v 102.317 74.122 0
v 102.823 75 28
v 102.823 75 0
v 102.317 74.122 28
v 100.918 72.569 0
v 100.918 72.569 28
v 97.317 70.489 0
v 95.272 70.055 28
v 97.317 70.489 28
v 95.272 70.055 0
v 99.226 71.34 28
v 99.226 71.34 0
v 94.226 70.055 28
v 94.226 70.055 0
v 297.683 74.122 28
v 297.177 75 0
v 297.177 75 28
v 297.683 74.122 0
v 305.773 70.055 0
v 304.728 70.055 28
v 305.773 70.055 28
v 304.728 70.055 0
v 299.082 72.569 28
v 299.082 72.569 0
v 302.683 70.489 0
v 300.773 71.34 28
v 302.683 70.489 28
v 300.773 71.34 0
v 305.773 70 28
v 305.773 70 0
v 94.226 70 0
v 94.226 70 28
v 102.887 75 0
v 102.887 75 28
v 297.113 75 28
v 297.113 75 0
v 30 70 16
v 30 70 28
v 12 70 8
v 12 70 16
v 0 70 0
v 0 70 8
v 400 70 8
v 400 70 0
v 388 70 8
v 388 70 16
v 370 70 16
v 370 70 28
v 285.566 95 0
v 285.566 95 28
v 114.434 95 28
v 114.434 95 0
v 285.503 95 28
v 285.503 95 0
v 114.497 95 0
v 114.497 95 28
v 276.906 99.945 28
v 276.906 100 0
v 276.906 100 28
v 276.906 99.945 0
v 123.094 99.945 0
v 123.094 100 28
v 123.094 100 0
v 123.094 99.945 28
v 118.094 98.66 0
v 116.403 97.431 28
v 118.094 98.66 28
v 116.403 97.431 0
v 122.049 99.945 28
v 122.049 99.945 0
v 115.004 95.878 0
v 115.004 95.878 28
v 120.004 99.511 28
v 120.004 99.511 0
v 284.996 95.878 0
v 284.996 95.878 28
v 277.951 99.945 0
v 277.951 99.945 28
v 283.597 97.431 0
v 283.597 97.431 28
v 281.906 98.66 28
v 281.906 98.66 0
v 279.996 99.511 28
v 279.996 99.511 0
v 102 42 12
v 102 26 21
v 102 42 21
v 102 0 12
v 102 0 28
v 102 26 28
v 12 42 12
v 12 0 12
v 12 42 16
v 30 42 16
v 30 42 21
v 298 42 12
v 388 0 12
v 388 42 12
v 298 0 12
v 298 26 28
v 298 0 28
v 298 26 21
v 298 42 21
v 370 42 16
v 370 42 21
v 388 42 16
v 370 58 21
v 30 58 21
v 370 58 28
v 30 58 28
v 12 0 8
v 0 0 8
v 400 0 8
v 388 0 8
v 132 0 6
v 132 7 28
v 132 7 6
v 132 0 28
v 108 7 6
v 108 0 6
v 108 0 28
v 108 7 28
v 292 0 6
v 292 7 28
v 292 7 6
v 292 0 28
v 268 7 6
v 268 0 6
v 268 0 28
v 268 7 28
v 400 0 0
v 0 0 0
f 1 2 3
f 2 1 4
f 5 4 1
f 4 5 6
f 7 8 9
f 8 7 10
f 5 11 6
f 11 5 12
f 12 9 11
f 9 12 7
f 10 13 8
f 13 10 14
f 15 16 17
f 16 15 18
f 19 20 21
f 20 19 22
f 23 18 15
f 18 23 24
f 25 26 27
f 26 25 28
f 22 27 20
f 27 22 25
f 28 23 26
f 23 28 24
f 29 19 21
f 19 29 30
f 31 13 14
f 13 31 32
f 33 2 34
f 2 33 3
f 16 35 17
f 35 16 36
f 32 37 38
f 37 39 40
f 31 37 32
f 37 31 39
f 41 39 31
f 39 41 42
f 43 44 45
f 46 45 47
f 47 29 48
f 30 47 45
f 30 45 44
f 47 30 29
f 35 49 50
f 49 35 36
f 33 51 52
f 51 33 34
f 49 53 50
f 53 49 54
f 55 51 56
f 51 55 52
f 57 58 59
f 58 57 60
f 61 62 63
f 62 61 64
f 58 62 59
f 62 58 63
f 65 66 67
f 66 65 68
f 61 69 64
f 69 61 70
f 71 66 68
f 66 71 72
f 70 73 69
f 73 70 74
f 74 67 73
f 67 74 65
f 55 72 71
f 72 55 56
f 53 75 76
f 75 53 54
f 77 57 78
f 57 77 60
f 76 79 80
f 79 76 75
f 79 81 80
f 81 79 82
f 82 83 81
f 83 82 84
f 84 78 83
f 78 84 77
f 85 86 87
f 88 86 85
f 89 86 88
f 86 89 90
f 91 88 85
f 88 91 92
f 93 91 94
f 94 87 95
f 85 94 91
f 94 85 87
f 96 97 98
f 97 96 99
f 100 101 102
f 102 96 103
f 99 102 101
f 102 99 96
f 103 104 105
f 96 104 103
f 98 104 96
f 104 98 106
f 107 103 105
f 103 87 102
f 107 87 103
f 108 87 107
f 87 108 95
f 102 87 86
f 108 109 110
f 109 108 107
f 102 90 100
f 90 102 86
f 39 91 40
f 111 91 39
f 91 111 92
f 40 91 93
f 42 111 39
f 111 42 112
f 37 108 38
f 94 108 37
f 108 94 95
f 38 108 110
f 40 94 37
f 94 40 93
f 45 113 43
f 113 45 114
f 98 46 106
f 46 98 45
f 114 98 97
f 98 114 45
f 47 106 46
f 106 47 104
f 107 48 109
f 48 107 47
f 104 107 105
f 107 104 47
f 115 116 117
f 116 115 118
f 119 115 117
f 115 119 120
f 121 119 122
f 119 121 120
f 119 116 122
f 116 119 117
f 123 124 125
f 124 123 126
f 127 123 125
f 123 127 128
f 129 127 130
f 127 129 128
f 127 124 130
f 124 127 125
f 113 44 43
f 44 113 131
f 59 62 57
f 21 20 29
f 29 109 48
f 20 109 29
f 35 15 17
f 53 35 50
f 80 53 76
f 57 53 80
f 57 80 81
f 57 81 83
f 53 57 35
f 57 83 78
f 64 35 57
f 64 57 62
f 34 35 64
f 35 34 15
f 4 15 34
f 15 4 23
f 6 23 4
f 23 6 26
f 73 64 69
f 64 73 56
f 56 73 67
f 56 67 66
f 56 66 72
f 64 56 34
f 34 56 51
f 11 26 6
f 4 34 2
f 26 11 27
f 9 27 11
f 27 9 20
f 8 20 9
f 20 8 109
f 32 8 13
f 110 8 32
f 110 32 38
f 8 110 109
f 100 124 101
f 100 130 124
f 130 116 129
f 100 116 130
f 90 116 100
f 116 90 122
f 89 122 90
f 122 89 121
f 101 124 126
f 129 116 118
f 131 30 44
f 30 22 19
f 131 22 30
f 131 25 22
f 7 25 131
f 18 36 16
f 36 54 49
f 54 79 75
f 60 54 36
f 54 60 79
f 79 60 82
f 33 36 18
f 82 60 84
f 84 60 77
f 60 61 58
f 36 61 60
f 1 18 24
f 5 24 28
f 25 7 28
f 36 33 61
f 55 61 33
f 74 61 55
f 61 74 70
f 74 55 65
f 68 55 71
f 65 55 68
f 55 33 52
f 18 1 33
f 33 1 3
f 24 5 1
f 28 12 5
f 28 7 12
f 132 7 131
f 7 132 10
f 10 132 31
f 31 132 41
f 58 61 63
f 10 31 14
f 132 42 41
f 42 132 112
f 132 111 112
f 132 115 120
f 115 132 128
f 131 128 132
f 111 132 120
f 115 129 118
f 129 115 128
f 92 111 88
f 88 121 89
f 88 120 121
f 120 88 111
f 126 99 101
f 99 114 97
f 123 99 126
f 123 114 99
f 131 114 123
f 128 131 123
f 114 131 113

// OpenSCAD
include <../src/wardrobe.scad>;
plank_xz_front_top(wardrobe_n);
//github_openscad -o wardrobe_3/plank_xz_front_top.stl -D wardrobe_n=3 -D cutting_edge=0 -D break_view_length=0 wardrobe_3/plank_xz_front_top_stl.scad
